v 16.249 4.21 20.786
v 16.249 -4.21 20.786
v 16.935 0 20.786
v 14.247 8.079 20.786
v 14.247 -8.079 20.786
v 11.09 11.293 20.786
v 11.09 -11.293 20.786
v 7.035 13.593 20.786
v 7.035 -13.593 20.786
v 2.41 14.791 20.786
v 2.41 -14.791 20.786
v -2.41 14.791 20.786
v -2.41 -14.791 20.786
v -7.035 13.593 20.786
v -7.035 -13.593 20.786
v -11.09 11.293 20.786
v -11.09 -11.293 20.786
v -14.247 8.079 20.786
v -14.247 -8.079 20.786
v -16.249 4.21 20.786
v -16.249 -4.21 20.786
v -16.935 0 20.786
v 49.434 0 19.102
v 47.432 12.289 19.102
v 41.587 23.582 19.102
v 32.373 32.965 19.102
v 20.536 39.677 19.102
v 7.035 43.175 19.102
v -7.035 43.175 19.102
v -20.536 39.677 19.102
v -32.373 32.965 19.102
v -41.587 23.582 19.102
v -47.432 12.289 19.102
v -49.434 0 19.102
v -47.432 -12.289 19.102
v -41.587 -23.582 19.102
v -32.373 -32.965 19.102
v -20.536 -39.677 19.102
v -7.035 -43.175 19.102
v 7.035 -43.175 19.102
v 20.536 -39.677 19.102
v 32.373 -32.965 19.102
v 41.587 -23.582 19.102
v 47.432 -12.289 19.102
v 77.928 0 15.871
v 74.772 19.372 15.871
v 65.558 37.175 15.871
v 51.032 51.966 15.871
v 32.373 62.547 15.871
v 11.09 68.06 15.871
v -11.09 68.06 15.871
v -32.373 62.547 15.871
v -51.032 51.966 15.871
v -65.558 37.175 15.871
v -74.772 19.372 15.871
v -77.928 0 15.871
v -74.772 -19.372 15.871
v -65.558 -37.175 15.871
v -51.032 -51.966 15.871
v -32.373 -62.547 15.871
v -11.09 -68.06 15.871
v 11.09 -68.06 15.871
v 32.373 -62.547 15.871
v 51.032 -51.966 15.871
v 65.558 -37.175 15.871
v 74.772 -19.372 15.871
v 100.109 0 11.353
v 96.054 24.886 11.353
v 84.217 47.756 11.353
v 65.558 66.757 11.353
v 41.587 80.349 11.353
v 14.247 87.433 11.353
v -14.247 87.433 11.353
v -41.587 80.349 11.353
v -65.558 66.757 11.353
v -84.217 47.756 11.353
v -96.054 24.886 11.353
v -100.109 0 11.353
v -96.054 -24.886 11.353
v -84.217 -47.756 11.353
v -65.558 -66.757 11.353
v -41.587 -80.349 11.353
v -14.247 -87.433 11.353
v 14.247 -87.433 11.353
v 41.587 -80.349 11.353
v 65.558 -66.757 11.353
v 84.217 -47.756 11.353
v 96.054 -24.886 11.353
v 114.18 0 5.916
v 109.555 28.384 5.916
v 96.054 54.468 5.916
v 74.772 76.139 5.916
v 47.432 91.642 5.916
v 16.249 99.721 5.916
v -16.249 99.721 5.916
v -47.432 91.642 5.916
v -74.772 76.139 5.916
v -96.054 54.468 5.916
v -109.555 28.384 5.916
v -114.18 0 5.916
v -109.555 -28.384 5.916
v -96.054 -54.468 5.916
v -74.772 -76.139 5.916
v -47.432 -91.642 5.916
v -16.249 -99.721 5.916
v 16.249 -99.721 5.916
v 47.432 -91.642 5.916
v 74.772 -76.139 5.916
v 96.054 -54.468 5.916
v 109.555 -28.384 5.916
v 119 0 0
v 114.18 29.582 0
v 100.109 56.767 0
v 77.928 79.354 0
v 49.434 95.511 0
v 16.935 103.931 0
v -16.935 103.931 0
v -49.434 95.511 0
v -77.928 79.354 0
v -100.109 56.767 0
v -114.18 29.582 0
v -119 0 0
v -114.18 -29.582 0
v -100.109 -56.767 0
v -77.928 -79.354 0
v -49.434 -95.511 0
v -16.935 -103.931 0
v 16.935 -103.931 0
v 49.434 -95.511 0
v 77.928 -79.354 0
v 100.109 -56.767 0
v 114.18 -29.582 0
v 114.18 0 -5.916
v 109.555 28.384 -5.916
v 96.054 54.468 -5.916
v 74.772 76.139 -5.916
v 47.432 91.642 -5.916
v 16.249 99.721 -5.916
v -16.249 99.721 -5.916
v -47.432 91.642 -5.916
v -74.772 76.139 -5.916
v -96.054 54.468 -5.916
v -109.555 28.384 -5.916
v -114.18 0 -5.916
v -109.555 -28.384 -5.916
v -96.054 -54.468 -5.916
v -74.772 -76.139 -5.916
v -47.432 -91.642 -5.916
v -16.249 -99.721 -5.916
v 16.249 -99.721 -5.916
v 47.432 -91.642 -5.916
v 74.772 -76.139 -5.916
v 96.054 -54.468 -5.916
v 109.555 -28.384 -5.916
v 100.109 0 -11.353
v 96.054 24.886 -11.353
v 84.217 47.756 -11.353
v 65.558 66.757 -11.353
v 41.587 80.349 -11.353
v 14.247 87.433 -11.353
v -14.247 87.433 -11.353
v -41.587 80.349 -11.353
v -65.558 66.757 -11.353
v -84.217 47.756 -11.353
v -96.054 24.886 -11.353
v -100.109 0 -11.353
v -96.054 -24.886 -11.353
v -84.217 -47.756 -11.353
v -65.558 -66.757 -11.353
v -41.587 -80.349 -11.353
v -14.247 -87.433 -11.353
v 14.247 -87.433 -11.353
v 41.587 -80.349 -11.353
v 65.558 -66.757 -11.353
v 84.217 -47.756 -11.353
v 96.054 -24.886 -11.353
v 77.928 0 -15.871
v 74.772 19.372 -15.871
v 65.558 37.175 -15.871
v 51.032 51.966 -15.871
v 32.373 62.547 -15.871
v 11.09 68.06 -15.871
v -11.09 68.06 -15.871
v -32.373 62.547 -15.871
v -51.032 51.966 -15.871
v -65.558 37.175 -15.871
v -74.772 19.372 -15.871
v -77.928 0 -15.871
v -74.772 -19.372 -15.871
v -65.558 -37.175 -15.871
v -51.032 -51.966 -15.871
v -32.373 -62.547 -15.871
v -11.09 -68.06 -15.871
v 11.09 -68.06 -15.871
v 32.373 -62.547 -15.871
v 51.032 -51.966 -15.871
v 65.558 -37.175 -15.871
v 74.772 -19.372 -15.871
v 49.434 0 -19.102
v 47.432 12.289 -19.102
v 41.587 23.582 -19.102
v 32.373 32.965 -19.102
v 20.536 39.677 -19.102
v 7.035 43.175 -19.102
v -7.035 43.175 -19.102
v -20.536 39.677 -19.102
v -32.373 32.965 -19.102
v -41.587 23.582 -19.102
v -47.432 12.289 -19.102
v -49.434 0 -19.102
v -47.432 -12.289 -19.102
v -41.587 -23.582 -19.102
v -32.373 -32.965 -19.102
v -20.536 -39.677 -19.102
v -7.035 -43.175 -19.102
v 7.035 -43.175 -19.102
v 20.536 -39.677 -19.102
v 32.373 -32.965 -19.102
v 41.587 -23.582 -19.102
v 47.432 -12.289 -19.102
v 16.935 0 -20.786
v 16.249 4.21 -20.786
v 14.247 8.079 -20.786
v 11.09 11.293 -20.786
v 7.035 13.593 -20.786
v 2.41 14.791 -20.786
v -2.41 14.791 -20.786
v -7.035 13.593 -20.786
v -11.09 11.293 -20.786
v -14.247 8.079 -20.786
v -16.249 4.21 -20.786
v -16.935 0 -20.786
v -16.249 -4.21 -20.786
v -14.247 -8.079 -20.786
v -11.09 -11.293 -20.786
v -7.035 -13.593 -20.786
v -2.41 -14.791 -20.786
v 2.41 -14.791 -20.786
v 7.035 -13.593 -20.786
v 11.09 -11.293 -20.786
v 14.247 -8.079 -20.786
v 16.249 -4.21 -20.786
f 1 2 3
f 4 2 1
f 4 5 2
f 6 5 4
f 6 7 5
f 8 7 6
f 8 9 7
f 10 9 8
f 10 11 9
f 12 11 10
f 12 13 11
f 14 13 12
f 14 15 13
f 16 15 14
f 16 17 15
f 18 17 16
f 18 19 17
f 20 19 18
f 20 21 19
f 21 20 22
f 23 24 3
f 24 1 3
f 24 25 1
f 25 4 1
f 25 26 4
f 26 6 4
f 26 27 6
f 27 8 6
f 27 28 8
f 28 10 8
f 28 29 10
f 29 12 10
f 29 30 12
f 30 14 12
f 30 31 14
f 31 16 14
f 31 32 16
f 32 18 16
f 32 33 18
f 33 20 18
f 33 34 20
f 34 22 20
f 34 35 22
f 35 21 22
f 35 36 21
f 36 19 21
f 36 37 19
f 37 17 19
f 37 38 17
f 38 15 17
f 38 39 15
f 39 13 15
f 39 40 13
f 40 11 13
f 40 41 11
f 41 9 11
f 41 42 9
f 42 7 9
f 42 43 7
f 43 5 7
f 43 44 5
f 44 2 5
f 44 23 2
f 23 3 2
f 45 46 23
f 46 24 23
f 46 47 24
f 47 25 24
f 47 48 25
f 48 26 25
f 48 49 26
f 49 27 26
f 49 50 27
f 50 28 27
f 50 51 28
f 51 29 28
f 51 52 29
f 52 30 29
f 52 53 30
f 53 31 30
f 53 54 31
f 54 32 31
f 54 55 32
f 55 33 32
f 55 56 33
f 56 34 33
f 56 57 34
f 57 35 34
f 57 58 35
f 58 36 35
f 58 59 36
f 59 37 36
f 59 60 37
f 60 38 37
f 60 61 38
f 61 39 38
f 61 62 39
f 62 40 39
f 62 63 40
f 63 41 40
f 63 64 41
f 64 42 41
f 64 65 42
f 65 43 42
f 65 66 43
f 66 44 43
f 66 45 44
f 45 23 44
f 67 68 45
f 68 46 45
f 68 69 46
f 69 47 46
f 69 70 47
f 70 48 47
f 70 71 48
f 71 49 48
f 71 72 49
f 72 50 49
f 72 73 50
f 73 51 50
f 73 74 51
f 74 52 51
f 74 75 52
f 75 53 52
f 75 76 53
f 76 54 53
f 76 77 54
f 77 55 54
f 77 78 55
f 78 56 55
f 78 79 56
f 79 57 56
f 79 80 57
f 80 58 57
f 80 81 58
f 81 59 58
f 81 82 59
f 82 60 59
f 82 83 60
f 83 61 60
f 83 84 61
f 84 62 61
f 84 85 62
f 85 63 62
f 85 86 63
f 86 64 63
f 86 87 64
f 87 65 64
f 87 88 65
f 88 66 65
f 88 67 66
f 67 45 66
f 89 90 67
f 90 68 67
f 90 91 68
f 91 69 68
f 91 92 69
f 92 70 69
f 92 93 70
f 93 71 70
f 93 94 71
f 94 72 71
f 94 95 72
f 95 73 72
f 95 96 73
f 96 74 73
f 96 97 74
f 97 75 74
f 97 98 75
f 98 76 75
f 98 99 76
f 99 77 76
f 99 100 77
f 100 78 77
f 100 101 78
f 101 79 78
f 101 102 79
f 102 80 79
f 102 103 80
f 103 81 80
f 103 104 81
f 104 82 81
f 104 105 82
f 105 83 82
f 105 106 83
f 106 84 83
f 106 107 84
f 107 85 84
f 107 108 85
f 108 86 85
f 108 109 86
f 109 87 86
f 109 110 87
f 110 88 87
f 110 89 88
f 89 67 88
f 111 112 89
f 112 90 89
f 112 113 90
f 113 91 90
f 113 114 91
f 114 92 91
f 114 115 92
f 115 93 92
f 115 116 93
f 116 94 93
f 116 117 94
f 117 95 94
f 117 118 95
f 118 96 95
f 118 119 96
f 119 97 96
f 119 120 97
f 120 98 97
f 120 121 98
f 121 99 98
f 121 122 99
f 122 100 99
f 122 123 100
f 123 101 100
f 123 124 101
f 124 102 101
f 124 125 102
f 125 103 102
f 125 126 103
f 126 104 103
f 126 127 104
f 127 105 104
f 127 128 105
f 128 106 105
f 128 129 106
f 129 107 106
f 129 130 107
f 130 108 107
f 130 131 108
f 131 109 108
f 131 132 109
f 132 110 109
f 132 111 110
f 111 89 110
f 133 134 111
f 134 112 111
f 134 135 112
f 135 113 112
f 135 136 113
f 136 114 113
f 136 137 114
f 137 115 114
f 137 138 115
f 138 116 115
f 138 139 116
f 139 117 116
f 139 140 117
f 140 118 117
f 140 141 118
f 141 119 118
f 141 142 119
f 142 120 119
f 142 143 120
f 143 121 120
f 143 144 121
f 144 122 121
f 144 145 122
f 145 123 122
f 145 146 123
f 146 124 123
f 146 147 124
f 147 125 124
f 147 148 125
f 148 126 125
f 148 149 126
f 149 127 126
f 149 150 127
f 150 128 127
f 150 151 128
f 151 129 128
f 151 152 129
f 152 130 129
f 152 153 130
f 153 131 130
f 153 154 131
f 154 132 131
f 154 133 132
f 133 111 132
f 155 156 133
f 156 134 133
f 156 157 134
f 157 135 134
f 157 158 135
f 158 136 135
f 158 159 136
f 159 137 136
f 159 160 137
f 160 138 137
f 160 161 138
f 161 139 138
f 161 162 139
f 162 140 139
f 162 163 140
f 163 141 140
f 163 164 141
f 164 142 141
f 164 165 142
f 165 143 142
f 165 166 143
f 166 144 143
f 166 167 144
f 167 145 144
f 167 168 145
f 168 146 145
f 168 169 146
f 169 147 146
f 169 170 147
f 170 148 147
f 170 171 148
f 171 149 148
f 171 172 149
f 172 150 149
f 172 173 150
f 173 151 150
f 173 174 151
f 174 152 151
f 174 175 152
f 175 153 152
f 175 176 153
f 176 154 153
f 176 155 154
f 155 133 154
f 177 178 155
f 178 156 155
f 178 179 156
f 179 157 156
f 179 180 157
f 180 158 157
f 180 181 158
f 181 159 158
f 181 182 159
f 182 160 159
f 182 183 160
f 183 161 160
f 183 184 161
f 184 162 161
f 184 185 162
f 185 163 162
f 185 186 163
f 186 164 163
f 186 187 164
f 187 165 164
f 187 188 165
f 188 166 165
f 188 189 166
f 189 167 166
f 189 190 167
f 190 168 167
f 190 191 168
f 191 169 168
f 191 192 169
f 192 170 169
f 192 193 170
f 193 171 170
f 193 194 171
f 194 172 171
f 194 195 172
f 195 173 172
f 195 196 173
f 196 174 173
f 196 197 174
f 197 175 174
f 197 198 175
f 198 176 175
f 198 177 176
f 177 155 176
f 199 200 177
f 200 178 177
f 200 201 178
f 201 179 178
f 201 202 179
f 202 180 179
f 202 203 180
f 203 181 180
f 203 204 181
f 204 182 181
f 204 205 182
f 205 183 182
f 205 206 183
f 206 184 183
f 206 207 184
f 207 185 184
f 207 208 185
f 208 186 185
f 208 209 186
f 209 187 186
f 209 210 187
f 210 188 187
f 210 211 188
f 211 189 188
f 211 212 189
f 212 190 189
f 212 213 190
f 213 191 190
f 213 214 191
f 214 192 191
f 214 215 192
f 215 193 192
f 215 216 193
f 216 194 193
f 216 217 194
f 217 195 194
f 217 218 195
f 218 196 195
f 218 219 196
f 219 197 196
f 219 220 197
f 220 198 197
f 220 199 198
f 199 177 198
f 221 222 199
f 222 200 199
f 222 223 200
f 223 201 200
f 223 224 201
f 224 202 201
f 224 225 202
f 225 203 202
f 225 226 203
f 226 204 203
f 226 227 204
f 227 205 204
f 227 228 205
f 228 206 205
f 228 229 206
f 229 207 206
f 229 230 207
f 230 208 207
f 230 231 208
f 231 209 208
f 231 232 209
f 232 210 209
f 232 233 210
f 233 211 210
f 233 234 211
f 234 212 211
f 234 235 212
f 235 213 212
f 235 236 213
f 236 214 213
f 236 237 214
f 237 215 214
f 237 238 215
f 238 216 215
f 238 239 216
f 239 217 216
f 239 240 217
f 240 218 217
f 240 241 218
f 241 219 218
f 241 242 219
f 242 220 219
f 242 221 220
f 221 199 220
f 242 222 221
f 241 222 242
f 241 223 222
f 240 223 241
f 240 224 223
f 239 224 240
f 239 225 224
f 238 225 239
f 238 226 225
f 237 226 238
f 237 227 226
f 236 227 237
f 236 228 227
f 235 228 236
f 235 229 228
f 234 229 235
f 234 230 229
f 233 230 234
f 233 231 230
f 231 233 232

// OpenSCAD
// Generated by SolidPython 1.0.1 on 2020-07-29 00:46:53


scale(v = [17, 15, 3]) {
	sphere(r = 7);
}
/***********************************************
*********      SolidPython code:      **********
************************************************
 
# import packages: SolidPython
from solid import *
from solid.utils import *
from itertools import chain, combinations, permutations


class Resize:

    def __init__(self, scad_file):
        self.scad_file = scad_file
        #self.scad_file = import_scad(scad_file)
        # cone/cylinder param:
        self.r1 = 0
        self.r2 = 0
        self.h = 0
        # rectangular prism param:
        self.w = 0
        self.l = 0
        # ellipse param:
        self.r = 0

    # import OpenScad code (file name corresponds to shape)


    # classify shape + parameters
    def assign(self, param1, param2, param3):
        if self.scad_file == 'cone.scad':
            self.r1 = param1
            self.r2 = param2
            self.h = param3
        elif self.scad_file == 'cylinder.scad':
            self.r1 = param1
            self.r2 = param2
            self.h = param3
        elif self.scad_file == 'rectangularPrism.scad':
            self.h = param1
            self.l = param2
            self.w = param3
        else:
            self.r = param1
            self.h = param2

    # resize parameters
    def iterate(self):
        x = range(3, 20, 2)
        i = 1
        if self.scad_file == 'cone.scad':
            tempList = list(permutations(x, 2))
            for temp in tempList:
                param1 = temp[0]
                param2 = temp[1]
                filepath = 'produced_scad_files/' + 'cone' + str(param1) + '_' + str(param2) + '_' + '.scad'
                scad_render_to_file(cylinder(h=param1, r1=param2, r2=0), filepath)

        elif self.scad_file == 'cylinder.scad':
            tempList = list(permutations(x, 3))
            for temp in tempList:
                param1 = temp[0]
                param2 = temp[1]
                filepath = 'produced_scad_files/' + 'cylinder' + str(param1) + '_' + str(param2) + '_' + '.scad'
                scad_render_to_file(cylinder(h=param1, r1=param2, r2=param2), filepath)

        elif self.scad_file == 'rectangularPrism.scad':
            tempList = list(permutations(x, 3))
            for temp in tempList:
                param1 = temp[0]
                param2 = temp[1]
                param3 = temp[2]
                filepath = 'produced_scad_files/' + 'rectangularPrism' + str(param1) + '_' + str(param2) + '_' + str(
                    param3) + '.scad'
                scad_render_to_file(cube(size=(param1, param2, param3)), filepath)

        elif self.scad_file == 'ellipse.scad':
            tempList = list(permutations(x, 4))
            for temp in tempList:
                param1 = temp[0]
                param2 = temp[1]
                param3 = temp[2]
                param4 = temp[3]
                filepath = 'produced_scad_files/' + 'ellipse' + str(param1) + '_' + str(param2) + '_' + str(param3) + '_' + str(param4) + '.scad'
                scad_render_to_file(scale([param1, param2, param3])(sphere(r=param4)), filepath)

    def render_to_scadfile(self):
        scad_render_to_file(scad, 'example.scad') 
 
************************************************/
